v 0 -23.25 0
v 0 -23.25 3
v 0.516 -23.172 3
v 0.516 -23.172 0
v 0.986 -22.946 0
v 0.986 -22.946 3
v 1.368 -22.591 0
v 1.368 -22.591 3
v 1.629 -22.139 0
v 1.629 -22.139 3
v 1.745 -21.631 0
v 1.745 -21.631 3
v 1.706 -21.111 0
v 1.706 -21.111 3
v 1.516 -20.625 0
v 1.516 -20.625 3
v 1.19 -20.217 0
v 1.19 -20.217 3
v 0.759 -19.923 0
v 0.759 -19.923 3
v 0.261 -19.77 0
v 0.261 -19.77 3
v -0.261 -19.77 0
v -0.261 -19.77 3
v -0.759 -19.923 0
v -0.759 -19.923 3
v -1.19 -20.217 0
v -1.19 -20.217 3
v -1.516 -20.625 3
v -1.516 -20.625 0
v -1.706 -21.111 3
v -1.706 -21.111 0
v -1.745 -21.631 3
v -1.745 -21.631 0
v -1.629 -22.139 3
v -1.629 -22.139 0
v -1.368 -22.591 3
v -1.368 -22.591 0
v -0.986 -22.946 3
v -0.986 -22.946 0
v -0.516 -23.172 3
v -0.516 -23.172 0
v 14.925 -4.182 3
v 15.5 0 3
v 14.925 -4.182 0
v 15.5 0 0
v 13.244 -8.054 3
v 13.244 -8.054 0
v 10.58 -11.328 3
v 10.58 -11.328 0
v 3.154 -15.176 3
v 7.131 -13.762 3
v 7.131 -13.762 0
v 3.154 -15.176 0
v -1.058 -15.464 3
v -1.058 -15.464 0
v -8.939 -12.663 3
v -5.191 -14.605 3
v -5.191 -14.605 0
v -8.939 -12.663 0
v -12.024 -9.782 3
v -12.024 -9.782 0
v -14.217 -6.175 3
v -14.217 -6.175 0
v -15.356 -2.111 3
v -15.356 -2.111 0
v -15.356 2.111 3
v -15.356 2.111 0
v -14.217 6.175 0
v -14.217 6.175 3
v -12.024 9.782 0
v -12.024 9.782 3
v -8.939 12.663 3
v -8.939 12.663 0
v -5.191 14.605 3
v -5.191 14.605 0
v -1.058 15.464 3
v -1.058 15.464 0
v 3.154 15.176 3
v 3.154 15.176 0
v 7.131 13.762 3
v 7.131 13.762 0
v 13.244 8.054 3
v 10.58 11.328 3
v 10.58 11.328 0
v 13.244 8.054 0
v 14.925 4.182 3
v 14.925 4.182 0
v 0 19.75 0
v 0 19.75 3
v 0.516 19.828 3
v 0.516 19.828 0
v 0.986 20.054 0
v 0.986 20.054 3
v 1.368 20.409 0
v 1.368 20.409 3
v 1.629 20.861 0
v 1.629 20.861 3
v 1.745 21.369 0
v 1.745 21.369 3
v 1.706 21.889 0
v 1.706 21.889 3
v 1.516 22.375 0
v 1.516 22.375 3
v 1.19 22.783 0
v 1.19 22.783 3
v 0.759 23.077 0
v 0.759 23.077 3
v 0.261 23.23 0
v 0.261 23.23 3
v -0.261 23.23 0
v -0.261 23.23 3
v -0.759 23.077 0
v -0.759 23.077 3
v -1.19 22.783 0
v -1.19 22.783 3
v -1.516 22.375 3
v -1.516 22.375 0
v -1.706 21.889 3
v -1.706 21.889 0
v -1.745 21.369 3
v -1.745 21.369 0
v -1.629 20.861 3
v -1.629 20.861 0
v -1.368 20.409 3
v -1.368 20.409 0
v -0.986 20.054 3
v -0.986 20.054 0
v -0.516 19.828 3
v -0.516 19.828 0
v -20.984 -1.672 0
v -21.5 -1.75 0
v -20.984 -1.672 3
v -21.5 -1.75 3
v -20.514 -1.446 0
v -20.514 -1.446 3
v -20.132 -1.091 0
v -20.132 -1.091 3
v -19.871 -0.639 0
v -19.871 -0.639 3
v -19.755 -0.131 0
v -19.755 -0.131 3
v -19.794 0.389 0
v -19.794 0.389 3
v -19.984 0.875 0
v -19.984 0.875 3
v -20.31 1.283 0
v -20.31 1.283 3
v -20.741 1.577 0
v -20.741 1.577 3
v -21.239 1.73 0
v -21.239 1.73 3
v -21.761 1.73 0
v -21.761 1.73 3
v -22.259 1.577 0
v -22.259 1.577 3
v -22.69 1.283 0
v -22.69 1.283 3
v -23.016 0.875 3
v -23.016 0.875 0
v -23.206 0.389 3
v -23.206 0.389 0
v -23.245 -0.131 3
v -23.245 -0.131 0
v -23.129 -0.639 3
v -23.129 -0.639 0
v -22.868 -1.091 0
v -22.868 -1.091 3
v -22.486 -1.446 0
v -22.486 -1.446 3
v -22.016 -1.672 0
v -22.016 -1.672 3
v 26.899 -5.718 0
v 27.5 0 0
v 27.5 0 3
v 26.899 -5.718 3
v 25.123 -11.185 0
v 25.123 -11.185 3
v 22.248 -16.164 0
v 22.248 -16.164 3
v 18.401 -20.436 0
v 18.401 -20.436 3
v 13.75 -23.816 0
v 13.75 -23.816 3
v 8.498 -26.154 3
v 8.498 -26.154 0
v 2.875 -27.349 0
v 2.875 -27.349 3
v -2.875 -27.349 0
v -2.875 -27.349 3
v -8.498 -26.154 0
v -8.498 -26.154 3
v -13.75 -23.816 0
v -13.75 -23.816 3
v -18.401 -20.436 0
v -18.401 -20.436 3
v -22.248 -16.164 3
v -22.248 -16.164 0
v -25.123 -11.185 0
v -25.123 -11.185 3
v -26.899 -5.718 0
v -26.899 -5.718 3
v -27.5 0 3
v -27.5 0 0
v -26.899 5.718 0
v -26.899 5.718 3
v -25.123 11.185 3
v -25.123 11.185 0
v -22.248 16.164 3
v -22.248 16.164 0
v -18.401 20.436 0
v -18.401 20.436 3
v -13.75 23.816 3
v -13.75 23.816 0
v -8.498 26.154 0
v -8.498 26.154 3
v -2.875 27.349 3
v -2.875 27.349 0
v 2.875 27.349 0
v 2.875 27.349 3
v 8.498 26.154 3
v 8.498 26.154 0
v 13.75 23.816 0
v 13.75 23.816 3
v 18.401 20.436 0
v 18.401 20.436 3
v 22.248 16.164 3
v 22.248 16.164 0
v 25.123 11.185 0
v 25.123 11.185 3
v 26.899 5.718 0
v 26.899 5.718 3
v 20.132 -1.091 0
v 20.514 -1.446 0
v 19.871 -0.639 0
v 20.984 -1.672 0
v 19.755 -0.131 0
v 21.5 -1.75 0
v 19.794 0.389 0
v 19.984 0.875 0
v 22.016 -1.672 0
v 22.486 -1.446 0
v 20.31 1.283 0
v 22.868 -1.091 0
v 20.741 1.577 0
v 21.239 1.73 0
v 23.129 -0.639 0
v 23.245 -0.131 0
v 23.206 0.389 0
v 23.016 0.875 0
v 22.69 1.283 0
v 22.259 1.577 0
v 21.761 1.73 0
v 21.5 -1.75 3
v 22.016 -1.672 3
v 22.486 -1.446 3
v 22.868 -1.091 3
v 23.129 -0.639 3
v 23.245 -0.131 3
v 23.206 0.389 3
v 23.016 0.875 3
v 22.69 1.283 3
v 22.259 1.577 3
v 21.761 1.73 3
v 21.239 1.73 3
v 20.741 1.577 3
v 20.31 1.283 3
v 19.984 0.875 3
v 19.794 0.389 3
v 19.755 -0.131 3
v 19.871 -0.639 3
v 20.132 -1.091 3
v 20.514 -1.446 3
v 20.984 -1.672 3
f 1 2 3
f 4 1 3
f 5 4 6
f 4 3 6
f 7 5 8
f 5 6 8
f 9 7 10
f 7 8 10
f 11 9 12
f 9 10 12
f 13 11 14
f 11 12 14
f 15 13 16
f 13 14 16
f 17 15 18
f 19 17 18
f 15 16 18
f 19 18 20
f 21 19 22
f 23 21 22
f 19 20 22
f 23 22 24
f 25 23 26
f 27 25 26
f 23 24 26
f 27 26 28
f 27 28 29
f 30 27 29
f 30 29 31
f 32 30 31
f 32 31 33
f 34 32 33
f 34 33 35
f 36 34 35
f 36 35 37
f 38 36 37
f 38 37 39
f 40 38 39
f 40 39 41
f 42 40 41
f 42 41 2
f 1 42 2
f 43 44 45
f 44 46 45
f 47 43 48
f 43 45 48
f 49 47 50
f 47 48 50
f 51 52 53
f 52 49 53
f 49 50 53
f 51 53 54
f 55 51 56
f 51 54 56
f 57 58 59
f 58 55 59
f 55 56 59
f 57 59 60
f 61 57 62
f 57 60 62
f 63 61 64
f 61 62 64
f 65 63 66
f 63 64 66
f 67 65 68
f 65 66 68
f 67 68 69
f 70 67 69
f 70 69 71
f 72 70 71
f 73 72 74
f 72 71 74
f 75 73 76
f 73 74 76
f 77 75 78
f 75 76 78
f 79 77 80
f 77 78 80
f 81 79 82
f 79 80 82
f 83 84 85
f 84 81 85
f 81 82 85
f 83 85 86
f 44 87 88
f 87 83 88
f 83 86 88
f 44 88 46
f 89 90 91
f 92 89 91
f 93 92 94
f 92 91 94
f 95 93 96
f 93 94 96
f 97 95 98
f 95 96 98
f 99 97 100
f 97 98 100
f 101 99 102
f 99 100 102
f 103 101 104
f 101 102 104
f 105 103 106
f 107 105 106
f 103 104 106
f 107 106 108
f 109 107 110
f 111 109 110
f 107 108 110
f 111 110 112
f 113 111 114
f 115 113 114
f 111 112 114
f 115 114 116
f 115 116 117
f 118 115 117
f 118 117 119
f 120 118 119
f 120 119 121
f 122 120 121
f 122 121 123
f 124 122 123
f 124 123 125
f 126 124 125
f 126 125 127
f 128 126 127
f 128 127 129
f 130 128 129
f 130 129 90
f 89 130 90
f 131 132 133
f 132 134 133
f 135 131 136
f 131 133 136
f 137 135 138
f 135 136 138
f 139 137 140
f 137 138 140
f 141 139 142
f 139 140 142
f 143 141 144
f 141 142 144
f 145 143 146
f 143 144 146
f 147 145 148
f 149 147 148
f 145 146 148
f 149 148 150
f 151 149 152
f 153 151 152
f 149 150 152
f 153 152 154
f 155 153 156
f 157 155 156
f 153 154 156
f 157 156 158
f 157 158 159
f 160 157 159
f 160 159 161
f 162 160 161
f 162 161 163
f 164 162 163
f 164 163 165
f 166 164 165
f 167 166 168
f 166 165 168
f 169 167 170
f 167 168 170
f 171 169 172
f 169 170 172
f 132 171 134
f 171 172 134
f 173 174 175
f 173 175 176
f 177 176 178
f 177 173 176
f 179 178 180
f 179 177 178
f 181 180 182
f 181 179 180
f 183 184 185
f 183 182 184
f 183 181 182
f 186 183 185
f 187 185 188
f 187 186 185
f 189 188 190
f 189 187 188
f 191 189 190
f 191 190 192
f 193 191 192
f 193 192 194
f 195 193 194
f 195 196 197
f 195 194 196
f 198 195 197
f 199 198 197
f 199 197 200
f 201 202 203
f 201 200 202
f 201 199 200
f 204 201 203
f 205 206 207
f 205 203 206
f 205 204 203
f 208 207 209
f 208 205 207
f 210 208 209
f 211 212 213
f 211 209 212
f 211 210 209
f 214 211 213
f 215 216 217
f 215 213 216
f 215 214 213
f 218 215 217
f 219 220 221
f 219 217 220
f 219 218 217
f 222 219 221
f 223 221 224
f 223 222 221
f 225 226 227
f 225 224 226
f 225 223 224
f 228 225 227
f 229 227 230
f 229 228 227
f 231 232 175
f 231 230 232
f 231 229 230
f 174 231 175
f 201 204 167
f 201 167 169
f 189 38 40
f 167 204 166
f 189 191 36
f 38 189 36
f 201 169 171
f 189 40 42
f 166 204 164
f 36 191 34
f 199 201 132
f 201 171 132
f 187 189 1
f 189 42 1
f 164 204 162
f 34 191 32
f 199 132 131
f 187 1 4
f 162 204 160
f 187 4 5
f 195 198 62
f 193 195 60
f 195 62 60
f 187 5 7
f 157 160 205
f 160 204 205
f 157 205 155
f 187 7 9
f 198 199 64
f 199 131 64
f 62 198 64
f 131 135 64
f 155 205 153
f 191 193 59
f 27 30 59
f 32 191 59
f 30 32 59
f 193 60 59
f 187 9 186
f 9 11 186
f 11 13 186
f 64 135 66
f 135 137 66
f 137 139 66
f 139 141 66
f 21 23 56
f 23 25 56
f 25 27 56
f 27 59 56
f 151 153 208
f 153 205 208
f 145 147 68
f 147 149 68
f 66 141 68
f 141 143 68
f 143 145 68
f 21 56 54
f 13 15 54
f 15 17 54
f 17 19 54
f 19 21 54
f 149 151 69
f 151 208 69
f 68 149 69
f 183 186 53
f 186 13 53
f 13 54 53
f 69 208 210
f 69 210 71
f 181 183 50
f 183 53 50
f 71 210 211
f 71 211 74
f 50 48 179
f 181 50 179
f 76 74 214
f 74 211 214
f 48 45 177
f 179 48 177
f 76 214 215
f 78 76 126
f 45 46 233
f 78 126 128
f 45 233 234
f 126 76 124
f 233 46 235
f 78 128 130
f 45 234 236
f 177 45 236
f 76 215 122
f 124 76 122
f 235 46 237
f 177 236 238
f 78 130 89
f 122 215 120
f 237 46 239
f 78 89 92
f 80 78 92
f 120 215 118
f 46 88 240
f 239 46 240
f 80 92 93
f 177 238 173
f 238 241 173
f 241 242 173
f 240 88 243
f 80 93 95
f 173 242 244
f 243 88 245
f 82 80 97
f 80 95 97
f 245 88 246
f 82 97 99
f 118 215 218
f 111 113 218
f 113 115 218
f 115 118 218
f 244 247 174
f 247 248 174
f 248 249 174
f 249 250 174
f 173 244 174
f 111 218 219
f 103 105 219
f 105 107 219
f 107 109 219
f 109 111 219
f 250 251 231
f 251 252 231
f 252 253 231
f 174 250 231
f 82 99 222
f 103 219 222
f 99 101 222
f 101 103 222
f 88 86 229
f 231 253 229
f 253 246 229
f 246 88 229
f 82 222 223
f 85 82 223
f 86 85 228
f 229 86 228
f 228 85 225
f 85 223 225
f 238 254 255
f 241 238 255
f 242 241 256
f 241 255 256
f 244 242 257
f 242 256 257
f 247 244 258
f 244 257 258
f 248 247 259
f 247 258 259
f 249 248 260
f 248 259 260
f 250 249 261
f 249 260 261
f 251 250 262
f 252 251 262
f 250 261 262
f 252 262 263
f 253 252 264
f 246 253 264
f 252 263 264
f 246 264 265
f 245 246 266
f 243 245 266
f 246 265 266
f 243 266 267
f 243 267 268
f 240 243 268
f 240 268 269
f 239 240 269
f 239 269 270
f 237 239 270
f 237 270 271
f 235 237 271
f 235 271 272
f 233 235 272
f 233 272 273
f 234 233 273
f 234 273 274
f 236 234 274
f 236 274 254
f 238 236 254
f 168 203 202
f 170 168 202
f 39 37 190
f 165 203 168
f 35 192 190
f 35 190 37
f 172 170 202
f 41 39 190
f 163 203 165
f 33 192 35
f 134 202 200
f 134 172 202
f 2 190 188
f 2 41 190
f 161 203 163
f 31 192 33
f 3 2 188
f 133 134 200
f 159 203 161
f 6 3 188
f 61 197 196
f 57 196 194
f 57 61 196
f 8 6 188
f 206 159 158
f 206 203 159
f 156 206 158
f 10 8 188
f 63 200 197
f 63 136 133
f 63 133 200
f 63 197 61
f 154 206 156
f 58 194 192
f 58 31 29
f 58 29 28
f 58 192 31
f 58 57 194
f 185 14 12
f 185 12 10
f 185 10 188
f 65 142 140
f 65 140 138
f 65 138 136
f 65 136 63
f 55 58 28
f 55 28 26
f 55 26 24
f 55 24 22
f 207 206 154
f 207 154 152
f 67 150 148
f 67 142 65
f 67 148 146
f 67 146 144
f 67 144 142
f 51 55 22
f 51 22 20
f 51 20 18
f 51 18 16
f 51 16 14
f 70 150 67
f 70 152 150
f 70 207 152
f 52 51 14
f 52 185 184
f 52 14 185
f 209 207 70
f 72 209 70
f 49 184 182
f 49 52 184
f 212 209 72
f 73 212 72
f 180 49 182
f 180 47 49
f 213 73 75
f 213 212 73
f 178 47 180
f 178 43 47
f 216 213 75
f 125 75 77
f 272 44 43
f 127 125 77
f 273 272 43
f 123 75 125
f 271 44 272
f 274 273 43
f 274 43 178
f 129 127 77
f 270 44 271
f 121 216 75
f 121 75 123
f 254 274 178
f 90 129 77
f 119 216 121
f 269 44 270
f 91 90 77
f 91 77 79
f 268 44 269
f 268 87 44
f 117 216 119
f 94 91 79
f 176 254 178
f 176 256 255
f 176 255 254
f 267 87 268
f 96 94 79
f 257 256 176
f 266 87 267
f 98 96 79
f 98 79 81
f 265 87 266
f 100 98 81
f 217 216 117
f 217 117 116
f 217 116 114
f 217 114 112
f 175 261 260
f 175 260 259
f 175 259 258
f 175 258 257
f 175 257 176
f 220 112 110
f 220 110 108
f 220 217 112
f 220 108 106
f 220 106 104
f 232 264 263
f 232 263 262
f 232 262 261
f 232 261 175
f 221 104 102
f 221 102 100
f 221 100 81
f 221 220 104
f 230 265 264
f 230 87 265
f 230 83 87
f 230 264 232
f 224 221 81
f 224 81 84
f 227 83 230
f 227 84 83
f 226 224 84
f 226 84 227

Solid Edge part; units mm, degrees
sketch "Sketch1" plane through (0, 0, 0) normal (0, 0, 1) x (1, 0, 0)
  circle A0 centre (0, 0) radius 15.5
  circle A1 centre (0, 0) radius 27.5
  dimension "D1" = 55
  dimension "D2" = 31
extrude "Protrusion1" add sketch "Sketch1" along normal blind 3
hole "Hole_1" at (-21.5, 0, 3) direction (0, 0, -1) diameter 3.5 end up to next
hole "Hole1" at (0, -21.5, 3) direction (0, 0, -1) diameter 3.5 end up to next
hole "Hole2" at (21.5, 0, 3) direction (0, 0, -1) diameter 3.5 end up to next
hole "Hole3" at (0, 21.5, 3) direction (0, 0, -1) diameter 3.5 end up to next
properties material "Aluminum, 6061-T6"
